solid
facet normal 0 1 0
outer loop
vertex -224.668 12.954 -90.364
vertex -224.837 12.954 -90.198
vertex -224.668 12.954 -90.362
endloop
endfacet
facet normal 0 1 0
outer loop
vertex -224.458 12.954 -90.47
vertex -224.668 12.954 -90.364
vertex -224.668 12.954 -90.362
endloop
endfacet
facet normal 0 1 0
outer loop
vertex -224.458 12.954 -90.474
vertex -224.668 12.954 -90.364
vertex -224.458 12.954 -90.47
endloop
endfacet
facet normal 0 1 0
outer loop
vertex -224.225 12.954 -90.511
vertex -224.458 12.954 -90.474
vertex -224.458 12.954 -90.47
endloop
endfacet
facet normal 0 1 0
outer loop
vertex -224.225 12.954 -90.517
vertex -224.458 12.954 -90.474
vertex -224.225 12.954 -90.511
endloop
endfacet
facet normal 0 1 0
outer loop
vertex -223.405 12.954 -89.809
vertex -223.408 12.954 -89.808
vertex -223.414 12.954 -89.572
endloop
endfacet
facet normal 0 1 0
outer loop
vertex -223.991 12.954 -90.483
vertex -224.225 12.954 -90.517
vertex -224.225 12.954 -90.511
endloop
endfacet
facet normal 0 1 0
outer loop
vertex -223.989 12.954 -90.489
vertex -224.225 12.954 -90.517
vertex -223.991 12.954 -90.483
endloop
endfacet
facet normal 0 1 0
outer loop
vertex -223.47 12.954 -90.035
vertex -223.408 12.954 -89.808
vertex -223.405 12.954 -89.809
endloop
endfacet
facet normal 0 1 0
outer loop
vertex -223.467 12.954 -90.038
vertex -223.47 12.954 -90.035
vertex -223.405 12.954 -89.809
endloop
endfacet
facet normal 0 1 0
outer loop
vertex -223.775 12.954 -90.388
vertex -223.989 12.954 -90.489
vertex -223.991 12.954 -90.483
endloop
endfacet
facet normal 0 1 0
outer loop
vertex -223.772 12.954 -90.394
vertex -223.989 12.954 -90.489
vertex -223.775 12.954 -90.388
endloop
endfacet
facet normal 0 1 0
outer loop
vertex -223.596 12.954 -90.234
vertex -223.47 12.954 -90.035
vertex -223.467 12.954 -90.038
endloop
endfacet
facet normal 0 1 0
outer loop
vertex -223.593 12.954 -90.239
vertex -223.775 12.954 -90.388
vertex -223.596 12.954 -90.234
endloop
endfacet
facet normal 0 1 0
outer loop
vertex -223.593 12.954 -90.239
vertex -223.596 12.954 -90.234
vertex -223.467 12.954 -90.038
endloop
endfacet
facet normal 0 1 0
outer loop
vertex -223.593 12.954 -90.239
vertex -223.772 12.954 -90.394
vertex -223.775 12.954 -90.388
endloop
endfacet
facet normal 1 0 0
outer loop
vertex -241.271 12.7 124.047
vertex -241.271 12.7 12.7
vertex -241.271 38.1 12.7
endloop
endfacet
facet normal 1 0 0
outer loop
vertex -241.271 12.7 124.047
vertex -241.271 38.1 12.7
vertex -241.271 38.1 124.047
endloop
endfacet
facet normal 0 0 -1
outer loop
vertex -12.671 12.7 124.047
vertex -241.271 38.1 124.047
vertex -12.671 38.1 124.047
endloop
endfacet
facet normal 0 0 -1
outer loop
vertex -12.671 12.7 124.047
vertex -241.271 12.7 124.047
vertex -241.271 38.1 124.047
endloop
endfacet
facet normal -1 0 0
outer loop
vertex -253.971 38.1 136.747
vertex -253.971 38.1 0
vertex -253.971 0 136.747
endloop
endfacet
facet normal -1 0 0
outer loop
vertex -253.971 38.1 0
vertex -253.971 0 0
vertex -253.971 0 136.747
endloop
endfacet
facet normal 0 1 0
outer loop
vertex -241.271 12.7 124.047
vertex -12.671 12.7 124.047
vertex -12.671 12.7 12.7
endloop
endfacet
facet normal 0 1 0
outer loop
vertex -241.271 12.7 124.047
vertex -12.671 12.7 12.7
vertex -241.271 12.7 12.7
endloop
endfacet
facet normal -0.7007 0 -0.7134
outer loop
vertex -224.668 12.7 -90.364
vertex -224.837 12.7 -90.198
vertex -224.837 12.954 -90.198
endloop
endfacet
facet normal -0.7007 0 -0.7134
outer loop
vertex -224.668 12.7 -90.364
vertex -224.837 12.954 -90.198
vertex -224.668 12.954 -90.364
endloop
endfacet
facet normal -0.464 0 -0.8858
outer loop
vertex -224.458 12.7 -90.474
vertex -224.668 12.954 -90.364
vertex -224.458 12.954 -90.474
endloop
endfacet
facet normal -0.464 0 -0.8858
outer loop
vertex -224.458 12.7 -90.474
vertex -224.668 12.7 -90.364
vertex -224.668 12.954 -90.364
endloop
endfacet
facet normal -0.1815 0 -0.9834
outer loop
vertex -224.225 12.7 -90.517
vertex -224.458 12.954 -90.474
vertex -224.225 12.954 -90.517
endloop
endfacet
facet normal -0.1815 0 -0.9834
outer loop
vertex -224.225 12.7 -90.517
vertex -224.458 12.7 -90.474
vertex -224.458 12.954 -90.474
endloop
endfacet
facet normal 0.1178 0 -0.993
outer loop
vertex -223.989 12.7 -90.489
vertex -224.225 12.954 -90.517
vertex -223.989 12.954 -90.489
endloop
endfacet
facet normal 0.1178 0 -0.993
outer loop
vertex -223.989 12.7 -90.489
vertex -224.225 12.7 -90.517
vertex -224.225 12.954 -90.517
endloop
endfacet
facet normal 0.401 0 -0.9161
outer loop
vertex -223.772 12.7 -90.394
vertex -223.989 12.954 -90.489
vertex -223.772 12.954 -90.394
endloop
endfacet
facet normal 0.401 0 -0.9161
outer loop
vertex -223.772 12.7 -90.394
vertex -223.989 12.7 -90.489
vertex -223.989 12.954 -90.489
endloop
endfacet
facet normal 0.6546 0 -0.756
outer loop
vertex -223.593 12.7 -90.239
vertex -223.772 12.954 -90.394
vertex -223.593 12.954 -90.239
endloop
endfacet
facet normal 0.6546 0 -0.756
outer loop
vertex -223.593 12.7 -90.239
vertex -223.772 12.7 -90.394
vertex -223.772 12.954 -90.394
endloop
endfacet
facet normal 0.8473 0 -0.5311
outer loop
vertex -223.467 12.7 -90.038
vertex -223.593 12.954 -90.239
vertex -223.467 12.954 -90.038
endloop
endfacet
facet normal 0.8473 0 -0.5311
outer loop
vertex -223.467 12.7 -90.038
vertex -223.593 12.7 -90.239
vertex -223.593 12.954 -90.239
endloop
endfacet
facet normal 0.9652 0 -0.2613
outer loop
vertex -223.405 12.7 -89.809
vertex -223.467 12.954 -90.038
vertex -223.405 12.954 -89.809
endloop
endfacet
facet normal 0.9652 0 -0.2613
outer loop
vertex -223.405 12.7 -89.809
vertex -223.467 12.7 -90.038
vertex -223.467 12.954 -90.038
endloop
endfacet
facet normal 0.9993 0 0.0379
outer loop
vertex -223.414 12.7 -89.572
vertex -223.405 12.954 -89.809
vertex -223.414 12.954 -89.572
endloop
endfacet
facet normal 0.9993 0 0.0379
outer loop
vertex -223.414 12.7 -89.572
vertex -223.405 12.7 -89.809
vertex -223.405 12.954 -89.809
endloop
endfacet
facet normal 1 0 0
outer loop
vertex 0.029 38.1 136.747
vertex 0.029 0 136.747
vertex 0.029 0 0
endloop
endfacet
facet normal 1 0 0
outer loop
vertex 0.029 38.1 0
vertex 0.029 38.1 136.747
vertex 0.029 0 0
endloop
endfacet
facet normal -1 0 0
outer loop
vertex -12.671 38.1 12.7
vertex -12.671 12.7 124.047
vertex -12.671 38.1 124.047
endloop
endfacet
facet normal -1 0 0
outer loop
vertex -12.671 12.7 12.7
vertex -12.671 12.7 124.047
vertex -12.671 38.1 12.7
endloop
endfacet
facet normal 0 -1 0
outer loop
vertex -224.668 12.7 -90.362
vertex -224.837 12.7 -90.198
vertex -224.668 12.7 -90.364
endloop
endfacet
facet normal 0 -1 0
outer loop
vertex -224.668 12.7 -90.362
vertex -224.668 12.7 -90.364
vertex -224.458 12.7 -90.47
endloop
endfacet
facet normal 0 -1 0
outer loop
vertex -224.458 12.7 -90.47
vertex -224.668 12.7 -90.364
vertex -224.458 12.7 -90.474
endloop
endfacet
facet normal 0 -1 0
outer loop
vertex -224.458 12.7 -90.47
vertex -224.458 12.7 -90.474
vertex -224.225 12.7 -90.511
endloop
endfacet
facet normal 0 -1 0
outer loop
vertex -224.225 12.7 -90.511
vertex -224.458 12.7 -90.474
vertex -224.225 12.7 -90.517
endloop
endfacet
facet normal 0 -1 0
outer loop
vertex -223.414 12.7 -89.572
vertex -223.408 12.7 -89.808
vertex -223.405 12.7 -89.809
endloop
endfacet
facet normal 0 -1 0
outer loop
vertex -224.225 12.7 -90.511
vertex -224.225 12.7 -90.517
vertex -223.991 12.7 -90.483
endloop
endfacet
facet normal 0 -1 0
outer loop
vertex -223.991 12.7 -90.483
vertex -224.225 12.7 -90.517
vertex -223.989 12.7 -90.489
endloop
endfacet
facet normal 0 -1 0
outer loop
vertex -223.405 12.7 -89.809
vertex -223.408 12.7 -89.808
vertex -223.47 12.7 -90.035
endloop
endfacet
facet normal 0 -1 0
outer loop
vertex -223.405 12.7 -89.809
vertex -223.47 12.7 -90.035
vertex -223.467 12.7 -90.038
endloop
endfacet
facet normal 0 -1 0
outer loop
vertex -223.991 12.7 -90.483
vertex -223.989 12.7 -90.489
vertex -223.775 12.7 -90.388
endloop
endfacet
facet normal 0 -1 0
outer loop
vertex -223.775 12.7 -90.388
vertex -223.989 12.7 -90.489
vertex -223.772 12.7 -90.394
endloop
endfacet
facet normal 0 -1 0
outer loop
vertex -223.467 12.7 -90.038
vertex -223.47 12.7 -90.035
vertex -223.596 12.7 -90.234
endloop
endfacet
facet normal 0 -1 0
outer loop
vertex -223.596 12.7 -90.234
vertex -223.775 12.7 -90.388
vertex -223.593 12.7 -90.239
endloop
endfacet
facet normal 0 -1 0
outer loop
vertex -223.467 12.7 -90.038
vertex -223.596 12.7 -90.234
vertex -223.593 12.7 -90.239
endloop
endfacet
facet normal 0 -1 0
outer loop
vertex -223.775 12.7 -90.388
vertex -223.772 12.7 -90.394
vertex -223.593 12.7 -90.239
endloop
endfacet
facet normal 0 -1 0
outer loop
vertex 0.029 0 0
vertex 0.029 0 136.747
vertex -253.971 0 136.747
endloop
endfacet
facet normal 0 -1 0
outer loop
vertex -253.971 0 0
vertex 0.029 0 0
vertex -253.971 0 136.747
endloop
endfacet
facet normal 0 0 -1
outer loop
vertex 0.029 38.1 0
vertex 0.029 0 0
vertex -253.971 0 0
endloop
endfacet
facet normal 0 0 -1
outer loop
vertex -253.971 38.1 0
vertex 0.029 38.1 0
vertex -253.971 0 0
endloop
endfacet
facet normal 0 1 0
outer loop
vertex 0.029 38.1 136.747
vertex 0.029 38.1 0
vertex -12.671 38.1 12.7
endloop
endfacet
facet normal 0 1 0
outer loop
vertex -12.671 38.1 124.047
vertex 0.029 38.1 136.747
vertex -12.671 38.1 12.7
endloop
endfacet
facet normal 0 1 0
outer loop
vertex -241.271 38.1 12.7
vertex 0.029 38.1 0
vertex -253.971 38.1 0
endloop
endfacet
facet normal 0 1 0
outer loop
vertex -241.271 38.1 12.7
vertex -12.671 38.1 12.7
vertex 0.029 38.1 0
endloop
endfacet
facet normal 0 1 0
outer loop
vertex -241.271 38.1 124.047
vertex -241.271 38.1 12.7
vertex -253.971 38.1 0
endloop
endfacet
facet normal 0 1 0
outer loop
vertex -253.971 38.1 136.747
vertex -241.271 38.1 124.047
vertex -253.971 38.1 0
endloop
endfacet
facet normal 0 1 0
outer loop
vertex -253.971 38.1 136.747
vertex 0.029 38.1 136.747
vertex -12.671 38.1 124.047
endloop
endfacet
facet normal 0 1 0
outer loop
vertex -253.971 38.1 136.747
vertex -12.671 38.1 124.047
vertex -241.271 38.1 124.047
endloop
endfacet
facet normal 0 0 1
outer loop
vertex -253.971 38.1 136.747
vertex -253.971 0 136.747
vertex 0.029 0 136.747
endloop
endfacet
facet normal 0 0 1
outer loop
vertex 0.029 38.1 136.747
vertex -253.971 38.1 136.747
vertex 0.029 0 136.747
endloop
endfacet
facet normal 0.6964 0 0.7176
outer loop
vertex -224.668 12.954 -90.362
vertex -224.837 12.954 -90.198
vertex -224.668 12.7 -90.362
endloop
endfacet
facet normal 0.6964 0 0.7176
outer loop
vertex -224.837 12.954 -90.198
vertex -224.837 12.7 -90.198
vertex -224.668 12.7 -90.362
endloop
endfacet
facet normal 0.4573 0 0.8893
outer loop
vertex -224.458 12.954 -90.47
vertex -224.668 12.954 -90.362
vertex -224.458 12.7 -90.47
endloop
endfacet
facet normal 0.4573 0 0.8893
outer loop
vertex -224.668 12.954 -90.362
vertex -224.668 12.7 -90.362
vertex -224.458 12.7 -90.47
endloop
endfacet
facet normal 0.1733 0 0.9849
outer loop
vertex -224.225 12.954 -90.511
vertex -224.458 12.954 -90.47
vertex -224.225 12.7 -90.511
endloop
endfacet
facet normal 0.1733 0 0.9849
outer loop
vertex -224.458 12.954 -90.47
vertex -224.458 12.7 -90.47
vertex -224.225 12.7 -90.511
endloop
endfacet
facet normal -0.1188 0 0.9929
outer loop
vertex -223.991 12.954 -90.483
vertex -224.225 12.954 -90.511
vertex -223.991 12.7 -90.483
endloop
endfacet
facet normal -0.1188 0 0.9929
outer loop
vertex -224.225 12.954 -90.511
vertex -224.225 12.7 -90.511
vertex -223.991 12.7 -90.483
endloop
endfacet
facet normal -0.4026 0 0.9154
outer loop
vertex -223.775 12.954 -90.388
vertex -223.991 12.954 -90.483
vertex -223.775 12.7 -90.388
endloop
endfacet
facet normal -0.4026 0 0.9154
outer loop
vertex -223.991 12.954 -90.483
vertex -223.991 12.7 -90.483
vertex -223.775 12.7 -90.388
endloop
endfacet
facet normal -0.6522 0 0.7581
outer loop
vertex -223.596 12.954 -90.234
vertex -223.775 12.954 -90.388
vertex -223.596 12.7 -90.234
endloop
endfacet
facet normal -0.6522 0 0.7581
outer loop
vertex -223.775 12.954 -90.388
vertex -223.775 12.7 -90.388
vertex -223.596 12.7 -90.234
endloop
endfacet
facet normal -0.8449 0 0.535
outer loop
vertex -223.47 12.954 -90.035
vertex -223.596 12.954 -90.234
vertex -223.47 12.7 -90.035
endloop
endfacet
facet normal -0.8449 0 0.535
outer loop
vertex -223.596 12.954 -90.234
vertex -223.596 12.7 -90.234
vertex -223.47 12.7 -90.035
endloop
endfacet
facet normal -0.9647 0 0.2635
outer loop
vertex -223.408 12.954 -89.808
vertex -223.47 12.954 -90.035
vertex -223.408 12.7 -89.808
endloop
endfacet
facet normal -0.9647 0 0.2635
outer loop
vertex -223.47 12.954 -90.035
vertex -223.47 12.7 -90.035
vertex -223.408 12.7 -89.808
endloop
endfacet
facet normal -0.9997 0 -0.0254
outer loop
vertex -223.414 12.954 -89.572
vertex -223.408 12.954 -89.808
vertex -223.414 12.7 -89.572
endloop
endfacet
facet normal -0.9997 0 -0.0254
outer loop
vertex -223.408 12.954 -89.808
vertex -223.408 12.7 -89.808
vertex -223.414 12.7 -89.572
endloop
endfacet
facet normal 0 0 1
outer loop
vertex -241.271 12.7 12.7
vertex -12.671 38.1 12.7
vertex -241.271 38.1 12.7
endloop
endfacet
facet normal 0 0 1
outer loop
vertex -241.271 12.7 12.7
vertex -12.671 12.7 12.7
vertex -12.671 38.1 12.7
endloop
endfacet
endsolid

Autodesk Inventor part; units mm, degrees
ref_plane "YZ Plane" through (0, 0, 0) normal (1, 0, 0) x (0, 1, 0)
ref_plane "XZ Plane" through (0, 0, 0) normal (0, 1, 0) x (-1, 0, 0)
ref_plane "XY Plane" through (0, 0, 0) normal (0, 0, 1) x (1, 0, 0)
sketch "Sketch1" plane through (0, 0, 0) normal (0, 1, 0) x (-1, 0, 0)
  line L0 (-0.0288, 0) -> (253.9712, 0)
  line L1 (253.9712, 0) -> (253.9712, 136.7472)
  line L2 (253.9712, 136.7472) -> (-0.0288, 136.7472)
  line L3 (-0.0288, 136.7472) -> (-0.0288, 0)
  line L4 (253.9712, 136.7472) -> (-0.0288, 136.7472)
  line L5 (-0.0288, 136.7472) -> (-0.0288, 0)
  line L6 (-0.0288, 0) -> (253.9712, 0)
  line L7 (253.9712, 0) -> (253.9712, 136.7472)
  line L8 (-0.0288, 136.7472) -> (253.9712, 136.7472)
  line L9 (253.9712, 136.7472) -> (253.9712, 0)
  line L10 (253.9712, 0) -> (-0.0288, 0)
  line L11 (-0.0288, 0) -> (-0.0288, 136.7472)
  dimension "d0" = 254
  dimension "d1" = 136.7536
extrude "Extrusion1" add sketch "Sketch1" along normal blind 38.1
shell "Shell1" thickness 12.7 removed faces 1 at (-169.3045, 38.1, 45.5824)
sketch "Sketch2" plane through (-241.2712, 12.7, 124.0472) normal (0, 1, 0) x (1, 0, 0)
  circle A0 centre (17.0726, 213.7662) radius 0.7982
  point P0 (241.2712, 124.0472)
extrude "Extrusion2" add sketch "Sketch2" along normal blind 0.254
sketch "Sketch3" plane through (-224.1986, 12.954, -89.719) normal (0, 1, 0) x (1, 0, 0)
  point P0 (224.1986, -89.719)
  point P1 (-0.0033, -0.0074)
hole "Hole1" at (-224.2019, 12.954, -89.7115) direction (0, -1, 0) diameter 1.6002 end through all
shell "Shell2" [suppressed]
sketch "Sketch4" plane through (0, 0, 0) normal (0, -1, 0) x (1, 0, 0)
  point P0 (0, 0)
properties part number "box final"
